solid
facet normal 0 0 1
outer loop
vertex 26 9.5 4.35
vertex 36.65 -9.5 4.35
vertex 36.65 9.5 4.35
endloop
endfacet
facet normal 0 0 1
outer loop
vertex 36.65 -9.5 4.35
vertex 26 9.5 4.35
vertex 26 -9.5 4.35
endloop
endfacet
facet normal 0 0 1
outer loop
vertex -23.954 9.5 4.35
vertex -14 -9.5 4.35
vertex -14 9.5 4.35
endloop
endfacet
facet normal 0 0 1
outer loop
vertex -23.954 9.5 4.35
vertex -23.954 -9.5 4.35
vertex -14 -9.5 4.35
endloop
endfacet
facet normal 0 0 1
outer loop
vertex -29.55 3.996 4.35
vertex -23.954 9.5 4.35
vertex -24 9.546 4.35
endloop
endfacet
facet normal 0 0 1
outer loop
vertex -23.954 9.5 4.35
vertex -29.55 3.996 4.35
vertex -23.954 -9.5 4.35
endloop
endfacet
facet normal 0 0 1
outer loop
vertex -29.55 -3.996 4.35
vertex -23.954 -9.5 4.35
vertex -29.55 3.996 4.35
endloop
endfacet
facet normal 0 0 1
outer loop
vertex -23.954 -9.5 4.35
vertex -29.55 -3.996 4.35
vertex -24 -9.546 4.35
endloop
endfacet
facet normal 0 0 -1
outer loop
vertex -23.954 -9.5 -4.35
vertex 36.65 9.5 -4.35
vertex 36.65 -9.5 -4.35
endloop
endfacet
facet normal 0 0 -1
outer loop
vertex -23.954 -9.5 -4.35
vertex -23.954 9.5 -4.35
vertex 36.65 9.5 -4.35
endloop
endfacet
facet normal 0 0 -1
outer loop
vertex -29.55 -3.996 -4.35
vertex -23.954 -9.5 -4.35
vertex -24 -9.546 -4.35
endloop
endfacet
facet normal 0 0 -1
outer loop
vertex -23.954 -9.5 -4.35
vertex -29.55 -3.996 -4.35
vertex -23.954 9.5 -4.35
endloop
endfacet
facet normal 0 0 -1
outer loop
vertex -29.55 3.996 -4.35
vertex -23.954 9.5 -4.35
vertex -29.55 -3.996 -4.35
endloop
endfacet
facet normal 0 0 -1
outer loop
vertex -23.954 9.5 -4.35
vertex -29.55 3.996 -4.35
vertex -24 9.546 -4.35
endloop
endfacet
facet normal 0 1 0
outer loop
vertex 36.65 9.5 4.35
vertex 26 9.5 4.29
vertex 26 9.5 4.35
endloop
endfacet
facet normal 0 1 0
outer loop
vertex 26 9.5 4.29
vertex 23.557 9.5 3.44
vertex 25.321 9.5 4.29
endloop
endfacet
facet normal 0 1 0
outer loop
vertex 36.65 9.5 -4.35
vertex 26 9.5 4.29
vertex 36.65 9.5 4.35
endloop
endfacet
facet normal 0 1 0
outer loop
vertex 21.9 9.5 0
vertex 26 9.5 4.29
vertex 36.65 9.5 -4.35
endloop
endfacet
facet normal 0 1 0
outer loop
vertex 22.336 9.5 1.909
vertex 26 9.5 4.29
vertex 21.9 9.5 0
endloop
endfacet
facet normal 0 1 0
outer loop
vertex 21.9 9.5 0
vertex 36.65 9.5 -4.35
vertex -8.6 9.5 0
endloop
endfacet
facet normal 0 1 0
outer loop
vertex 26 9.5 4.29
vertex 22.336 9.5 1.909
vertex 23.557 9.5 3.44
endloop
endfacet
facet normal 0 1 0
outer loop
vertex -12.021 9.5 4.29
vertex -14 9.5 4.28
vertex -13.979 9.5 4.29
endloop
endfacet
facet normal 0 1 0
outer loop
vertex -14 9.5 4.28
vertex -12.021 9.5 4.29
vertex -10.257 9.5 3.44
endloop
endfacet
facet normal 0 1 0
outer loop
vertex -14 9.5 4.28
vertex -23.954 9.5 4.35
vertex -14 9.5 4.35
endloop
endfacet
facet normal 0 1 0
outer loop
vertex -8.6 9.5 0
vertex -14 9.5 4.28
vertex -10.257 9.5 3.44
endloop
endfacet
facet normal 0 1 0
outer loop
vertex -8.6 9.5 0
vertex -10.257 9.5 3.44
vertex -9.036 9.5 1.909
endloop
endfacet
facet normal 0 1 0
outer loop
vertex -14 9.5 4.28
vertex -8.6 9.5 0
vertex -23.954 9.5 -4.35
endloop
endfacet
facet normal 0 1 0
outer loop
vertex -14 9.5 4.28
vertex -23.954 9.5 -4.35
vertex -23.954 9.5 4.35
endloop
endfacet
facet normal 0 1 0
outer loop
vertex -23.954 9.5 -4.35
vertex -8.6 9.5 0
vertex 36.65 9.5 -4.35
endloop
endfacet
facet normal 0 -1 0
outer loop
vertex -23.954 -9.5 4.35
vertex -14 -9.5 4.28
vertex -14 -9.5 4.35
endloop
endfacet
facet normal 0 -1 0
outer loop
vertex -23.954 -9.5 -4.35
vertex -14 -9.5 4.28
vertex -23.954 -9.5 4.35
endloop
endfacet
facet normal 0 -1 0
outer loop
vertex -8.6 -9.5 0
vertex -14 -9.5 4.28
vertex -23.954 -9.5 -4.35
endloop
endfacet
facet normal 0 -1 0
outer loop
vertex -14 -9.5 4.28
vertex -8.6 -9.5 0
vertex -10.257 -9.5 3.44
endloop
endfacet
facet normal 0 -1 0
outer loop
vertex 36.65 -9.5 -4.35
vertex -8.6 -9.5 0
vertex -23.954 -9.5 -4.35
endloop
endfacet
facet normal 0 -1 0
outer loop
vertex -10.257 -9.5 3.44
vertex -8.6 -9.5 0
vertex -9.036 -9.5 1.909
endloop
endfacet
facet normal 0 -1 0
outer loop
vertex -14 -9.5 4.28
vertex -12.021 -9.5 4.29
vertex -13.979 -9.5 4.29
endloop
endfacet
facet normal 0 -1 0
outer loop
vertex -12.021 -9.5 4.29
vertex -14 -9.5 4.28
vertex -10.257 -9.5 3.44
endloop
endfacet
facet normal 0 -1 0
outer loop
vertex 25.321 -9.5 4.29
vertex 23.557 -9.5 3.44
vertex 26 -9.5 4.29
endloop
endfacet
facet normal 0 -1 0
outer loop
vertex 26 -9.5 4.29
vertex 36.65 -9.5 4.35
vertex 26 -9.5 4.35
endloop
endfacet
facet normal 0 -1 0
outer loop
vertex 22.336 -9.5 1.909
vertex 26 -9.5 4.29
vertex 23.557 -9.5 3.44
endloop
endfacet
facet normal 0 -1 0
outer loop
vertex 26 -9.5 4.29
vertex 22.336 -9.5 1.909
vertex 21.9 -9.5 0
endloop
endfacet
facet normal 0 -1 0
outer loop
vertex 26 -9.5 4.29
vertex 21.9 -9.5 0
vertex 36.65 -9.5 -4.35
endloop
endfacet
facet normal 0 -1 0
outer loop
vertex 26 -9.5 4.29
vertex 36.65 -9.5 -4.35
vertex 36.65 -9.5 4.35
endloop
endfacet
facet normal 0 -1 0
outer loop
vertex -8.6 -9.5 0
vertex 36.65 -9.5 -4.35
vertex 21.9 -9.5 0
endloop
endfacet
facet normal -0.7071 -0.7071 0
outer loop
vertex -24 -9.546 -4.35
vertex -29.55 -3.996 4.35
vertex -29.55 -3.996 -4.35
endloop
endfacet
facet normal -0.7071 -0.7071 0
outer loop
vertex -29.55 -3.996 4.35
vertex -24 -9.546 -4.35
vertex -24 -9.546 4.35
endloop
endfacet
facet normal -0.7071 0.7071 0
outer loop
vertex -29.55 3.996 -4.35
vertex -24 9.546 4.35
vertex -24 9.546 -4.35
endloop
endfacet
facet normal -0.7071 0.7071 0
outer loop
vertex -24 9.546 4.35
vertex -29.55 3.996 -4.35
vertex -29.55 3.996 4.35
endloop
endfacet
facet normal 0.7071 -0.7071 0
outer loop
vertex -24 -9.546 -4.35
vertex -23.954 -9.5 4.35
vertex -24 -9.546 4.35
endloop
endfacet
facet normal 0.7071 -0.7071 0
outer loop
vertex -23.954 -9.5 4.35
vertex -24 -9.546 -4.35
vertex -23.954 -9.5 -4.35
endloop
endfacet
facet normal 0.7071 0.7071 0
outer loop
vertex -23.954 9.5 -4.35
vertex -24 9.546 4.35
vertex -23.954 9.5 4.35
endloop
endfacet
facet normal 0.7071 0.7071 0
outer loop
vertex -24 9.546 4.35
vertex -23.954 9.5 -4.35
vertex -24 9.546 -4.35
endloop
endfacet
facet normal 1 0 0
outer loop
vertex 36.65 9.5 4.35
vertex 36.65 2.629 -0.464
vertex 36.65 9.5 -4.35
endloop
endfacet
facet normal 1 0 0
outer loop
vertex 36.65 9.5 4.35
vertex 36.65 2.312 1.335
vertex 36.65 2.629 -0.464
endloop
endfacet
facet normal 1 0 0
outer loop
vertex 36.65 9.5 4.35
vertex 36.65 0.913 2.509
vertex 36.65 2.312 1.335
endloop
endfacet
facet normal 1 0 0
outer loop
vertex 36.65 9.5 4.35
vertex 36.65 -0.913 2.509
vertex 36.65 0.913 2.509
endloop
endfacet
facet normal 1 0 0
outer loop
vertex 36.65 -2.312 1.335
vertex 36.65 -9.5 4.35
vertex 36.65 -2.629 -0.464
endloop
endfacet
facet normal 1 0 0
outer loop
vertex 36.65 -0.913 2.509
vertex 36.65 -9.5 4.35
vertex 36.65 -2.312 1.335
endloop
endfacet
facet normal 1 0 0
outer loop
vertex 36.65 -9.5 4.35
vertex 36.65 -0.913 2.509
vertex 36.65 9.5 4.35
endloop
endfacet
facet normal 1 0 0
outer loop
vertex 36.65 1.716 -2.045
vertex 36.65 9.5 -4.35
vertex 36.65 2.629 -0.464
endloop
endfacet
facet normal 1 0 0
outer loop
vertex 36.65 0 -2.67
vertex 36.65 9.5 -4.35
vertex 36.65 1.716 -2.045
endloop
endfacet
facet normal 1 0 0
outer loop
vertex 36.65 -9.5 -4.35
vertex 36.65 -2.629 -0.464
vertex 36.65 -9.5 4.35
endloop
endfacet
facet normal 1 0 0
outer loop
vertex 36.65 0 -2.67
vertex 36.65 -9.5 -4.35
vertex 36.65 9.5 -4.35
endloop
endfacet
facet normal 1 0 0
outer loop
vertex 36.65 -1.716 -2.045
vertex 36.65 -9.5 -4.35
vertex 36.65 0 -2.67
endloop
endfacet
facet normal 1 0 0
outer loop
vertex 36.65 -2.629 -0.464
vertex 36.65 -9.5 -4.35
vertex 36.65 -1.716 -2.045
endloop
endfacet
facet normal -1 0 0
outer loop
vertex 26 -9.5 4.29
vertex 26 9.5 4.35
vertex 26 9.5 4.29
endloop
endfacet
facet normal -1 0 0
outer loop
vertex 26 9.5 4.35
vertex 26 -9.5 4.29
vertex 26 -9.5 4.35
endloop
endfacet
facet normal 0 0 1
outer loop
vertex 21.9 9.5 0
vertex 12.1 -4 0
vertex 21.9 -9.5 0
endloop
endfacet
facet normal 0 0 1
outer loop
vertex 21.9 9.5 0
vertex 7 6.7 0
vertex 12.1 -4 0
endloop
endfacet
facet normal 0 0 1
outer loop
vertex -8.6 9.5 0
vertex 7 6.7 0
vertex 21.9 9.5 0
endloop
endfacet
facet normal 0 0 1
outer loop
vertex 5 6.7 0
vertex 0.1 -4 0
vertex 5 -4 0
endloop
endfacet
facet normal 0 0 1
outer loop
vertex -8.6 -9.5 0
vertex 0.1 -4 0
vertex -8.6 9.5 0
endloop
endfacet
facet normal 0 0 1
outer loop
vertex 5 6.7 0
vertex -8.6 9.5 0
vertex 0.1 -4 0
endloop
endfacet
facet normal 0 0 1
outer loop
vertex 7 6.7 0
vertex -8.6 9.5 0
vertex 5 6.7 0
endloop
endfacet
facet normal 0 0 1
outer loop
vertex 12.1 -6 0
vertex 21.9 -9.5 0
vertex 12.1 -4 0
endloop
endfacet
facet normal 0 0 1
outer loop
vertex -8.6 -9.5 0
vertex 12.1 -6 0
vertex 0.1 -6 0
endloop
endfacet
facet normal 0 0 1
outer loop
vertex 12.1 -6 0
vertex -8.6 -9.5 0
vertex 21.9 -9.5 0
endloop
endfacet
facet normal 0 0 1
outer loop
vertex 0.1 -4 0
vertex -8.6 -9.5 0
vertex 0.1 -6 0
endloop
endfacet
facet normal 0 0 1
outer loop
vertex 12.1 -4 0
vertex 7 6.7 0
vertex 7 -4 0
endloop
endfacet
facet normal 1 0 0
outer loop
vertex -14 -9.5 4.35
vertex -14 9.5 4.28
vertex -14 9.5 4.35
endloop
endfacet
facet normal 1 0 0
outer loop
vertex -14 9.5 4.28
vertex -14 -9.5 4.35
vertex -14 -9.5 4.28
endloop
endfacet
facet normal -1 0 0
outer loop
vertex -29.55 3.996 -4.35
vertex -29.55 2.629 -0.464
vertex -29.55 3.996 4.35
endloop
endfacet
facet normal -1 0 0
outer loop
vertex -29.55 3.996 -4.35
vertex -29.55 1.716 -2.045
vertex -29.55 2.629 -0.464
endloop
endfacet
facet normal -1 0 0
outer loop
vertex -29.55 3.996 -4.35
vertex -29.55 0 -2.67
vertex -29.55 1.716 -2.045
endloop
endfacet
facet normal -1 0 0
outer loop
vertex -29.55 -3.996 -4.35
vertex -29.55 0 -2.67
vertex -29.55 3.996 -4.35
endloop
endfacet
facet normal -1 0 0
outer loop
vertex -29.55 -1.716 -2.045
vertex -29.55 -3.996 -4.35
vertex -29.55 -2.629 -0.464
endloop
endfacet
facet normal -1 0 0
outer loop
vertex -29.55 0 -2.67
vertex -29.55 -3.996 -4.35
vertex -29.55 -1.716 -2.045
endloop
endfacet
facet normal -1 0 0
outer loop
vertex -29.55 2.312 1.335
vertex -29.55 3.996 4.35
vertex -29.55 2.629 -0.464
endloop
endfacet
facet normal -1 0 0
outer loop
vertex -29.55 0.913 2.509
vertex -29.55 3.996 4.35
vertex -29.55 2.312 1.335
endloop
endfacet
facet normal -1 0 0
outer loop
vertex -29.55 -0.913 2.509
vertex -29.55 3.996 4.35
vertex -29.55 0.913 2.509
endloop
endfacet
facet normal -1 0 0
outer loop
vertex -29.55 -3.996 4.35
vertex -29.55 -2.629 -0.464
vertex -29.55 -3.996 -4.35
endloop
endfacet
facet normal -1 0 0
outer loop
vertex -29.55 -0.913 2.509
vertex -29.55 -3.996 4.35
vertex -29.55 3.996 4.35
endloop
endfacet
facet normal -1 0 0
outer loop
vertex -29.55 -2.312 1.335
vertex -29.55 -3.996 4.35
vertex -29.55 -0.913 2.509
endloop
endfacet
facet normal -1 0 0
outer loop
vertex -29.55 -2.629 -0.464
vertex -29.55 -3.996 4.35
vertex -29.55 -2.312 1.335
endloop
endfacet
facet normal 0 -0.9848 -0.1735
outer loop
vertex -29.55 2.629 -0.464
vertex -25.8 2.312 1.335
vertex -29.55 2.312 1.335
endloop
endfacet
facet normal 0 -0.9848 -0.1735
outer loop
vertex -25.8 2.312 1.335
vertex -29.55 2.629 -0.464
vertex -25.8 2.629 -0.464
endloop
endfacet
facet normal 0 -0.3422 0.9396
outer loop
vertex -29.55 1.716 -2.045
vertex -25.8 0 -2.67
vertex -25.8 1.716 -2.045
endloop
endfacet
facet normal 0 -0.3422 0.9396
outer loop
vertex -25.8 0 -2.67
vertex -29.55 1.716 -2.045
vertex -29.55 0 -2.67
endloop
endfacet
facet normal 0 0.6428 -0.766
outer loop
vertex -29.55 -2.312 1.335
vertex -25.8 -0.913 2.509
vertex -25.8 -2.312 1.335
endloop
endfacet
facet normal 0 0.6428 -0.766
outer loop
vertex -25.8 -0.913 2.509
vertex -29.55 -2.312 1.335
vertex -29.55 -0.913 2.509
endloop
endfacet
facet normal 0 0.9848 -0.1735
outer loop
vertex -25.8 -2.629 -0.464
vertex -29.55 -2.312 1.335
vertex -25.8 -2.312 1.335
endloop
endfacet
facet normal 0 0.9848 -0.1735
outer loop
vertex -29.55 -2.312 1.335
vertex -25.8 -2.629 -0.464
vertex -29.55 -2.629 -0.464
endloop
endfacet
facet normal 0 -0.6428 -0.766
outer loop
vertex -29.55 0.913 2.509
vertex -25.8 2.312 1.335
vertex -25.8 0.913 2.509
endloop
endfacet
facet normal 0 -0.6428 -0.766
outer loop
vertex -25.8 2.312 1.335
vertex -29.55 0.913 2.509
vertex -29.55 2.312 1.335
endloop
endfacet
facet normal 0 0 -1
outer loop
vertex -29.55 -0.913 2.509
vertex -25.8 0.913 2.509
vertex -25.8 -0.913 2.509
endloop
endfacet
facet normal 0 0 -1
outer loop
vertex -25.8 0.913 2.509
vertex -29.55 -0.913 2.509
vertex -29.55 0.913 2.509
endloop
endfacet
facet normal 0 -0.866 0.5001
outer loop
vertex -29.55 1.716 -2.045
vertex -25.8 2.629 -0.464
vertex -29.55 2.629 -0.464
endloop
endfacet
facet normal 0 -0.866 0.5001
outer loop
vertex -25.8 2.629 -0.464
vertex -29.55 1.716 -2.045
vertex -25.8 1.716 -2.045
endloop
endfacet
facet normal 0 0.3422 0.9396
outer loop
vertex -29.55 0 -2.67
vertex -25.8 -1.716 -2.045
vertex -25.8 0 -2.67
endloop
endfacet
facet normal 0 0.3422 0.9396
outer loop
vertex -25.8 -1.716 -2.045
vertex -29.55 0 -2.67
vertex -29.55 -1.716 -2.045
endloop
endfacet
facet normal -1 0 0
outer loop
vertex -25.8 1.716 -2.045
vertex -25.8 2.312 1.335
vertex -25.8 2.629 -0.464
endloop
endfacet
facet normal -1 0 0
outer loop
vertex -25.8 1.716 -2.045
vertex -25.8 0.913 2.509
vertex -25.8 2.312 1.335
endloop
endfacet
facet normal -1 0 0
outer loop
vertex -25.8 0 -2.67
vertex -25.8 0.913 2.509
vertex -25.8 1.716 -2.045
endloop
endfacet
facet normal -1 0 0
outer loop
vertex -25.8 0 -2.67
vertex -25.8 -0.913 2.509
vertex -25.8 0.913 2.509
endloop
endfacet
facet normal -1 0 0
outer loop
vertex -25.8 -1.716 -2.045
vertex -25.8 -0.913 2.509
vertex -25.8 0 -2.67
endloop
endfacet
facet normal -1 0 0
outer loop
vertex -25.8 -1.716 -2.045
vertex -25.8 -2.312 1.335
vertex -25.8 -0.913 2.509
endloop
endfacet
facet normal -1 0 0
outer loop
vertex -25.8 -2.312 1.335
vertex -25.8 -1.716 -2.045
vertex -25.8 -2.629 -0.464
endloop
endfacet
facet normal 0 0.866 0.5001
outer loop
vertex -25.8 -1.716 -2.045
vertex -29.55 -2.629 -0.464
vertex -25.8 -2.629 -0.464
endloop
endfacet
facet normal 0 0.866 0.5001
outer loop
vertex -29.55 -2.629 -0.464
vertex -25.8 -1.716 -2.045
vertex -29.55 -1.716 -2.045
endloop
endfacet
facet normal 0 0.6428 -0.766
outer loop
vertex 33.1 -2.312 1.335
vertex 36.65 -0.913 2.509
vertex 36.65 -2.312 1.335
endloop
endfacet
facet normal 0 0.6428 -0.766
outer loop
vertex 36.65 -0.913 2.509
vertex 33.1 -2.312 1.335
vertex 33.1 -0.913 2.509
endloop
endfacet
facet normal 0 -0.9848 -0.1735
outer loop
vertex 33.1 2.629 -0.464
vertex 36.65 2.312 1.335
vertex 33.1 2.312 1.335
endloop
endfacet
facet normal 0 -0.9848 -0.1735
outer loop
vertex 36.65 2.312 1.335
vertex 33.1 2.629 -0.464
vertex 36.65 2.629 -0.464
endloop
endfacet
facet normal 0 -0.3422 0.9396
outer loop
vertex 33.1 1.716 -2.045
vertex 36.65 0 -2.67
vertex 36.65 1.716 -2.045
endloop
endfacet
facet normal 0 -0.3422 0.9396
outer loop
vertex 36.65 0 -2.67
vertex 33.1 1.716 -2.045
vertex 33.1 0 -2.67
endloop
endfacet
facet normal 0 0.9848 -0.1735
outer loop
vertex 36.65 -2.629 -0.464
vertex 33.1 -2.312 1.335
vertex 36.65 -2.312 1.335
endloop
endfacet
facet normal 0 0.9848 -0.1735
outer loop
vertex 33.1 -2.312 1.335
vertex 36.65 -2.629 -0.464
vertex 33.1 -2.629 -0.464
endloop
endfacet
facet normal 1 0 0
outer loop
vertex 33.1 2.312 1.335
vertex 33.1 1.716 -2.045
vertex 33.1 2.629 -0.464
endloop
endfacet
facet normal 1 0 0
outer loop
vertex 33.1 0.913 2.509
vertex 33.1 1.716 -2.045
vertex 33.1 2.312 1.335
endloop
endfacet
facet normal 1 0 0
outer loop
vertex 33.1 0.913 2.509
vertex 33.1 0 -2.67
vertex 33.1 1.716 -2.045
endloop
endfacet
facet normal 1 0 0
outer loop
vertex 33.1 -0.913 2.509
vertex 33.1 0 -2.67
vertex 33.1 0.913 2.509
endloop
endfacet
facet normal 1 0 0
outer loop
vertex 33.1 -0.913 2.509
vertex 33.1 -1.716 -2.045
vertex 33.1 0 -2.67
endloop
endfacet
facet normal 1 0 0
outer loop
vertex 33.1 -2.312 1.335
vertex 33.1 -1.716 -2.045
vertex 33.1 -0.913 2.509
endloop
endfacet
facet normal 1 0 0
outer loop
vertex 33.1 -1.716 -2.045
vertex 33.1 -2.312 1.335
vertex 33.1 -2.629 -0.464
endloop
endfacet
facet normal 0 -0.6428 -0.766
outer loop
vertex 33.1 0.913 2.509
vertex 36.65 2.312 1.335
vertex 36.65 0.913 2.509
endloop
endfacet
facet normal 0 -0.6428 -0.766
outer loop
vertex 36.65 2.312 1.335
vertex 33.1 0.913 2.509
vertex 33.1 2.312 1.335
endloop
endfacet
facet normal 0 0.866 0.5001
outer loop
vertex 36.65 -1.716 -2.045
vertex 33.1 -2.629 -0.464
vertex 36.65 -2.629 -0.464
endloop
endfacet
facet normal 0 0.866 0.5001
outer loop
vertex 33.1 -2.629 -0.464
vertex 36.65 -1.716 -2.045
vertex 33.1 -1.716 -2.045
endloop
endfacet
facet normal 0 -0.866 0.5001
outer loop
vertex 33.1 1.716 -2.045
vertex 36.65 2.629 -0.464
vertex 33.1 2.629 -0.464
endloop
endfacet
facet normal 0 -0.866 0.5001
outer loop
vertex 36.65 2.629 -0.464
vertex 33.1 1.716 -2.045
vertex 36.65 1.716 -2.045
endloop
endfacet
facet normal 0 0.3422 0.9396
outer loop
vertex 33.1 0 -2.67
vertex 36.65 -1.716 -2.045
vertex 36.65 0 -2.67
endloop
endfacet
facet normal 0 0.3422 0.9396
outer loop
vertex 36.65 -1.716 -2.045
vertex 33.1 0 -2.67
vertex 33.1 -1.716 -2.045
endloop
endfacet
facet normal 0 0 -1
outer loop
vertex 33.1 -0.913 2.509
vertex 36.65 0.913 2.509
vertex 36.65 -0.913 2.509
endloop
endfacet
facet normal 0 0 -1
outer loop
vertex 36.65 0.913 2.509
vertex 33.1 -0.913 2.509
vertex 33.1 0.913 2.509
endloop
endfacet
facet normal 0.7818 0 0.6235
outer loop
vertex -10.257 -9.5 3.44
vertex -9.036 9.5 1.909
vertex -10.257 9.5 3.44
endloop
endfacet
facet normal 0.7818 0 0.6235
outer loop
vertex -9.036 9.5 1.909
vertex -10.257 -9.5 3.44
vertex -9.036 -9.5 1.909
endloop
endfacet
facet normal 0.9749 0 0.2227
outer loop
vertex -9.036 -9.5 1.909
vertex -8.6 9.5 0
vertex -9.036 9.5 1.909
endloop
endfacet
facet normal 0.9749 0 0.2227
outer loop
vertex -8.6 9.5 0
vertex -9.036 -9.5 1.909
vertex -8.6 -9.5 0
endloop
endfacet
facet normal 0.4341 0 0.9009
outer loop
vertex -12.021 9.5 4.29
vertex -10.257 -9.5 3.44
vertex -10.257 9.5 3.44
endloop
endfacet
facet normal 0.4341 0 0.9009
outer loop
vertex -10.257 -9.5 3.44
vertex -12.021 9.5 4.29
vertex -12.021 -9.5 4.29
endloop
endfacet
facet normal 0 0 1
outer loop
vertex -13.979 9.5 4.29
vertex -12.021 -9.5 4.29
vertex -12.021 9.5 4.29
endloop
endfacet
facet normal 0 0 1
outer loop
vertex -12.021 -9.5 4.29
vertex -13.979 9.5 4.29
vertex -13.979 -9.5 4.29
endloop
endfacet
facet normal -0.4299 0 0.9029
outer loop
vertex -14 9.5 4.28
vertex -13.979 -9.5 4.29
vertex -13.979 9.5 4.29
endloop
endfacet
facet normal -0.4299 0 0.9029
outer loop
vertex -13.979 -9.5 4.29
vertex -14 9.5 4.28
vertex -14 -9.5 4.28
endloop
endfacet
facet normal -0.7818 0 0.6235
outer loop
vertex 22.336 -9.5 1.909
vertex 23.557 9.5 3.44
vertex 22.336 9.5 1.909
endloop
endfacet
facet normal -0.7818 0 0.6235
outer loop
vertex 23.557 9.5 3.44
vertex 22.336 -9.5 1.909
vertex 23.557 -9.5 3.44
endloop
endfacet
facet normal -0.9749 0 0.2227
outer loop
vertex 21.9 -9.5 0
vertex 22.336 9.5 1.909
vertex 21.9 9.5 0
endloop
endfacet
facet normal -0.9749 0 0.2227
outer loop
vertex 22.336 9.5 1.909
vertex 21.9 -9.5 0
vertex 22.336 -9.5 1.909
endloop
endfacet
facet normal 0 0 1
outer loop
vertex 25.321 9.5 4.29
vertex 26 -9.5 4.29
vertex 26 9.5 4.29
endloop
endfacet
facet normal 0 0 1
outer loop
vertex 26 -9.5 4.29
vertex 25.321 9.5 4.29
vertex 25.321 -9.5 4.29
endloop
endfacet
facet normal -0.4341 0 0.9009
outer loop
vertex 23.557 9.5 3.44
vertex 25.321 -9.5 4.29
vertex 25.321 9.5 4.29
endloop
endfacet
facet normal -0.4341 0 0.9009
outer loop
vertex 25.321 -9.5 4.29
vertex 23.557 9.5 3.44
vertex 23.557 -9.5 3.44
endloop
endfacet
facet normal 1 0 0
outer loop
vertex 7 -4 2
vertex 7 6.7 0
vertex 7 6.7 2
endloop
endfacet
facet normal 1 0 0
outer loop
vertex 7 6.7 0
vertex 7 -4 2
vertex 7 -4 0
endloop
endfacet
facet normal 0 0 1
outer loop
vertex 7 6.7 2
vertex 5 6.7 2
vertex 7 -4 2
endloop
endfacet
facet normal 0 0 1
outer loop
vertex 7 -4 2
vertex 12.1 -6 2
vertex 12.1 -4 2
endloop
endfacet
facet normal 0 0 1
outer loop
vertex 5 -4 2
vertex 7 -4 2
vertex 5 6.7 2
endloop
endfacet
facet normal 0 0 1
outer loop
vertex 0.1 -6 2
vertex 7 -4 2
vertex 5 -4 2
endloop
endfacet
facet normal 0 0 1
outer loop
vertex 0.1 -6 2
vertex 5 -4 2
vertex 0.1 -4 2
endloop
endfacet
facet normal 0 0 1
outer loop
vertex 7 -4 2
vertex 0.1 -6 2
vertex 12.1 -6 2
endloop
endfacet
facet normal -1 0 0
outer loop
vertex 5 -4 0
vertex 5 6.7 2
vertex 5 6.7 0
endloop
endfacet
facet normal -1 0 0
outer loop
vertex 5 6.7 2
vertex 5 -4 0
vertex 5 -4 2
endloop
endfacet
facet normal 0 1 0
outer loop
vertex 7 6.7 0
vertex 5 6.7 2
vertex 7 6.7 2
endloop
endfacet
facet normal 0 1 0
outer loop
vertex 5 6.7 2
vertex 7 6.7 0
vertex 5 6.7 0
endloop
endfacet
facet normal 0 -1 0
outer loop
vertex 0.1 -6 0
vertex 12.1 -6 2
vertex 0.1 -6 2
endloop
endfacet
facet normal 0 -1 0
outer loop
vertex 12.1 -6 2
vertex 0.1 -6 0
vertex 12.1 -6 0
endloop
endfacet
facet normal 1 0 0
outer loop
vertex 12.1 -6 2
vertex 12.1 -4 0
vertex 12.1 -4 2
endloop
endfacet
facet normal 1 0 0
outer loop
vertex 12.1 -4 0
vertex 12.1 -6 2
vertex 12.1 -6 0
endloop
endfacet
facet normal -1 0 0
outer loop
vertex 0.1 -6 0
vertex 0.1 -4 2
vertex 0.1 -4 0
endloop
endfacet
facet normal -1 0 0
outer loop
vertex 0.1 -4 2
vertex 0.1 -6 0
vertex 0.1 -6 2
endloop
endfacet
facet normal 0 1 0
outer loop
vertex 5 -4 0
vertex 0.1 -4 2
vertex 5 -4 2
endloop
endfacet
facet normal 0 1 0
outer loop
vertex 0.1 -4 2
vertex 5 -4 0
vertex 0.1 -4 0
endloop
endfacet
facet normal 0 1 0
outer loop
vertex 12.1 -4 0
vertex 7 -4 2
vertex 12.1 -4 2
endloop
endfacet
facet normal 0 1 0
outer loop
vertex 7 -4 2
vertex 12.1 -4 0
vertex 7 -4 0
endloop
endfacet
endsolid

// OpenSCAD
//Азотистое основание: Тимин

x=50;
y=19;
z=9;
dx=9; //Длина разъема магнита
d=2.67; //Диаметр гнезда магнита

difference() {
union() { 
 #translate([0, 0, 0]) cube ([x-2, y, z-0.3], center=true);

  translate([-24, 0, 0]) rotate([0, 0, 45]) cube ([13.5, 13.5, z-0.3], center=true);
 
   #translate([30.1, 0, 0]) cube ([13.1, 19, z-0.3], center=true);

}  
  translate([6, 0, 3]) cube ([x-10, y+2, z/1.5], center=true); //Пространство для изменения объема поля с буквой


   #translate([-34.8, 0, 0]) cube ([10.5, 10.5, z+2], center=true); //Для вырезки с переди


    #rotate([0, 90, 0]) translate([0, 0, -34.8]) cylinder(dx, d, d);

     #rotate([0, 90, 0]) translate([0, 0, 33.1]) cylinder(dx, d,  d);

// #rotate([0, 90, 0]) translate([0, -4.5, 33.1]) cylinder(dx, d,  d);
}

rotate([90, 0, 0]) translate([-13, 0, -9.5]) cylinder(19, 4.4, 4.4);

rotate([90, 0, 0]) translate([26.3, 0, -9.5]) cylinder(19, 4.4, 4.4);

//буква Т означает Тимин
xx=2;
e=12;
dt=5; //перемещение буквы T по оси X
translate([dt, -6, 0]) cube([xx, e+0.7, xx]);
translate([dt-4.9, -6, 0]) cube([e, xx, xx]);
